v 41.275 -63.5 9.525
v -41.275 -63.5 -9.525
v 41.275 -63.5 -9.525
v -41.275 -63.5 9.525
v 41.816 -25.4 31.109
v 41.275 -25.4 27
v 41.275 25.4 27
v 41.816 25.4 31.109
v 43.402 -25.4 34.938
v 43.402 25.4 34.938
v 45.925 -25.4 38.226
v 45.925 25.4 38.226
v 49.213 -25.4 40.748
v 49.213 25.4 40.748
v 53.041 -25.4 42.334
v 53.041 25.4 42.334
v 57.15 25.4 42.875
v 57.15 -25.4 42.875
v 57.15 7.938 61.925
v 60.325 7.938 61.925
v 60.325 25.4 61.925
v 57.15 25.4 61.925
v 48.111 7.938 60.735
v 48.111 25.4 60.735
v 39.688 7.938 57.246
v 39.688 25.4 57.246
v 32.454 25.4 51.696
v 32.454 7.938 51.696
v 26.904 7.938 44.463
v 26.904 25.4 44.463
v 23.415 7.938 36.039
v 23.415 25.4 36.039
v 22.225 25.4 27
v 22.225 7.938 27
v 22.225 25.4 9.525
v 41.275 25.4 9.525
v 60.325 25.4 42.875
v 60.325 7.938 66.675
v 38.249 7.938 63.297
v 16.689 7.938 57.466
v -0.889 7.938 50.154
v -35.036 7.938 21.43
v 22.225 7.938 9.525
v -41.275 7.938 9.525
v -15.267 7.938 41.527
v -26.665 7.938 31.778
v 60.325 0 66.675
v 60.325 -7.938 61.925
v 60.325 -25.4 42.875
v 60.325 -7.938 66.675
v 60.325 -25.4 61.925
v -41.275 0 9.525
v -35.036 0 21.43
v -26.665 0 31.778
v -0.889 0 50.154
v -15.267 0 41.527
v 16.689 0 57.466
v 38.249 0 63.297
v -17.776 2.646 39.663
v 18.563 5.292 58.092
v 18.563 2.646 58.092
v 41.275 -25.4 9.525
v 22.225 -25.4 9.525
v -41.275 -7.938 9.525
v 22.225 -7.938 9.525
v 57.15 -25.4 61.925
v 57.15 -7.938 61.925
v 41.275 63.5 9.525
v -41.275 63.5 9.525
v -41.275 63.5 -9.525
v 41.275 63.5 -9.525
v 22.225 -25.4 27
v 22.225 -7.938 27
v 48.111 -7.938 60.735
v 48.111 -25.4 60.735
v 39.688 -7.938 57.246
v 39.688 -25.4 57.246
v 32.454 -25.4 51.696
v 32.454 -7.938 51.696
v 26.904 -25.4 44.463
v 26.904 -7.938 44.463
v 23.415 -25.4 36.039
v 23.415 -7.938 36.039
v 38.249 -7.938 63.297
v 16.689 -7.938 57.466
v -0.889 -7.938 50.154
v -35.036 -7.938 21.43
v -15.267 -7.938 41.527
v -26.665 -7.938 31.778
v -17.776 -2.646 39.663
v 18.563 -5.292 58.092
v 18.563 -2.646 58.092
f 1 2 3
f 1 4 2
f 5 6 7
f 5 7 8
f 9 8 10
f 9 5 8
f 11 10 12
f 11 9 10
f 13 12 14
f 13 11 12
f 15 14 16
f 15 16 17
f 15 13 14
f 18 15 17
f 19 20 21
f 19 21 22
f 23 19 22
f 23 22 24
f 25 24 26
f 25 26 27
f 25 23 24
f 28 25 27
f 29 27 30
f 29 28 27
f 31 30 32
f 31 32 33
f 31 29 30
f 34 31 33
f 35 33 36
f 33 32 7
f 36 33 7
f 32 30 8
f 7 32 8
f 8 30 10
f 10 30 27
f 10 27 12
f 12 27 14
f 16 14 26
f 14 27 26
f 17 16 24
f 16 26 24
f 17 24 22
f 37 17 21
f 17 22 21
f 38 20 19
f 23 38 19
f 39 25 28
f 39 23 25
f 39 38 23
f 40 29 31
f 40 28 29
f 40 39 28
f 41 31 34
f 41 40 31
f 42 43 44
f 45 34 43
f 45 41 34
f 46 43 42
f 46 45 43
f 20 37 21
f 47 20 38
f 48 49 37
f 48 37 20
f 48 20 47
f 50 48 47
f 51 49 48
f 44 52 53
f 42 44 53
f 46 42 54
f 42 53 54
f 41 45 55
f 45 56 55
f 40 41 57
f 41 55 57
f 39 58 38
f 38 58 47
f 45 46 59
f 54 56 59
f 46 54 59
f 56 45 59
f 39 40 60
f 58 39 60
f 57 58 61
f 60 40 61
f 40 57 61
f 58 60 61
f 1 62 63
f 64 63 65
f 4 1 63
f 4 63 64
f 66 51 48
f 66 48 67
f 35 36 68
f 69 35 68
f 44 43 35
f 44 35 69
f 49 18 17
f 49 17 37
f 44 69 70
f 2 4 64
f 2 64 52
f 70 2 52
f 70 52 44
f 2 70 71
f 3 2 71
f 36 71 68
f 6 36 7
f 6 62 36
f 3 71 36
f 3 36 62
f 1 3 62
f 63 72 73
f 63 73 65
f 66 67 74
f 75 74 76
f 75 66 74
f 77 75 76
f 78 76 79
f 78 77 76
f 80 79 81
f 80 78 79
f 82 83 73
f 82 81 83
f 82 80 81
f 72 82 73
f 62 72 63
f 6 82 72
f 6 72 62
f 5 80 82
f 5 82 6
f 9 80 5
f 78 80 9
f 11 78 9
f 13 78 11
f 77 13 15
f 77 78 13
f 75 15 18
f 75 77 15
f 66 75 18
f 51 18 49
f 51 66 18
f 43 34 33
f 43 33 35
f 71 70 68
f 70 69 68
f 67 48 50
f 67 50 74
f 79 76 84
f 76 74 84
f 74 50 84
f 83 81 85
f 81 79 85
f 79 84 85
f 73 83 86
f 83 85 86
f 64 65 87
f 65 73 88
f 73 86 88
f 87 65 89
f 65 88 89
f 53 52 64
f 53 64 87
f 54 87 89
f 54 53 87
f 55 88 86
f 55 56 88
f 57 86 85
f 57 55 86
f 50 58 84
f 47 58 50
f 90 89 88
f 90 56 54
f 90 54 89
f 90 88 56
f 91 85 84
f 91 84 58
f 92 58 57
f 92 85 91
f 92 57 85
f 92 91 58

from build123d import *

# Parameters (mm, degrees)
F1_DEPTH = 63.5
F2_DEPTH = 25.4
F3_DEPTH = 7.9375


with BuildPart() as f1:
    # F0 (on Front) → F1 (new body, symmetric)
    with BuildSketch(Plane.XZ):
        Polygon((-41.275, -9.525), (41.275, -9.525), (41.275, 9.525), (22.225, 9.525), (-41.275, 9.525), align=None)
    extrude(amount=F1_DEPTH, both=True)

    # F0 (on Front) → F2 (join, symmetric)
    with BuildSketch(Plane.XZ):
        with BuildLine():
            Line((22.225, 9.525), (41.275, 9.525))
            Line((41.275, 9.525), (41.275, 27.0002))
            ThreePointArc((41.275, 27.0002), (45.92468, 38.22552), (57.15, 42.8752))
            Line((57.15, 42.8752), (60.325, 42.8752))
            Line((60.325, 42.8752), (60.325, 61.9252))
            Line((60.325, 61.9252), (57.15, 61.9252))
            ThreePointArc((57.15, 61.9252), (32.454296, 51.695904), (22.225, 27.0002))
            Line((22.225, 27.0002), (22.225, 9.525))
        make_face()
    extrude(amount=F2_DEPTH, both=True)

    # F0 (on Front) → F3 (join, symmetric)
    with BuildSketch(Plane.XZ):
        with BuildLine():
            add(Edge.make_bspline(
                [(-41.275, 9.525), (-26.669292, 46.137553), (18.325027, 62.395359), (60.325, 66.675)],
                knots=[0, 0, 0, 0, 116.570504, 116.570504, 116.570504, 116.570504], degree=3))
            Line((-41.275, 9.525), (22.225, 9.525))
            Line((22.225, 9.525), (22.225, 27.0002))
            ThreePointArc((22.225, 27.0002), (32.454296, 51.695904), (57.15, 61.9252))
            Line((57.15, 61.9252), (60.325, 61.9252))
            Line((60.325, 61.9252), (60.325, 66.675))
        make_face()
    extrude(amount=F3_DEPTH, both=True)


solid = f1.part
